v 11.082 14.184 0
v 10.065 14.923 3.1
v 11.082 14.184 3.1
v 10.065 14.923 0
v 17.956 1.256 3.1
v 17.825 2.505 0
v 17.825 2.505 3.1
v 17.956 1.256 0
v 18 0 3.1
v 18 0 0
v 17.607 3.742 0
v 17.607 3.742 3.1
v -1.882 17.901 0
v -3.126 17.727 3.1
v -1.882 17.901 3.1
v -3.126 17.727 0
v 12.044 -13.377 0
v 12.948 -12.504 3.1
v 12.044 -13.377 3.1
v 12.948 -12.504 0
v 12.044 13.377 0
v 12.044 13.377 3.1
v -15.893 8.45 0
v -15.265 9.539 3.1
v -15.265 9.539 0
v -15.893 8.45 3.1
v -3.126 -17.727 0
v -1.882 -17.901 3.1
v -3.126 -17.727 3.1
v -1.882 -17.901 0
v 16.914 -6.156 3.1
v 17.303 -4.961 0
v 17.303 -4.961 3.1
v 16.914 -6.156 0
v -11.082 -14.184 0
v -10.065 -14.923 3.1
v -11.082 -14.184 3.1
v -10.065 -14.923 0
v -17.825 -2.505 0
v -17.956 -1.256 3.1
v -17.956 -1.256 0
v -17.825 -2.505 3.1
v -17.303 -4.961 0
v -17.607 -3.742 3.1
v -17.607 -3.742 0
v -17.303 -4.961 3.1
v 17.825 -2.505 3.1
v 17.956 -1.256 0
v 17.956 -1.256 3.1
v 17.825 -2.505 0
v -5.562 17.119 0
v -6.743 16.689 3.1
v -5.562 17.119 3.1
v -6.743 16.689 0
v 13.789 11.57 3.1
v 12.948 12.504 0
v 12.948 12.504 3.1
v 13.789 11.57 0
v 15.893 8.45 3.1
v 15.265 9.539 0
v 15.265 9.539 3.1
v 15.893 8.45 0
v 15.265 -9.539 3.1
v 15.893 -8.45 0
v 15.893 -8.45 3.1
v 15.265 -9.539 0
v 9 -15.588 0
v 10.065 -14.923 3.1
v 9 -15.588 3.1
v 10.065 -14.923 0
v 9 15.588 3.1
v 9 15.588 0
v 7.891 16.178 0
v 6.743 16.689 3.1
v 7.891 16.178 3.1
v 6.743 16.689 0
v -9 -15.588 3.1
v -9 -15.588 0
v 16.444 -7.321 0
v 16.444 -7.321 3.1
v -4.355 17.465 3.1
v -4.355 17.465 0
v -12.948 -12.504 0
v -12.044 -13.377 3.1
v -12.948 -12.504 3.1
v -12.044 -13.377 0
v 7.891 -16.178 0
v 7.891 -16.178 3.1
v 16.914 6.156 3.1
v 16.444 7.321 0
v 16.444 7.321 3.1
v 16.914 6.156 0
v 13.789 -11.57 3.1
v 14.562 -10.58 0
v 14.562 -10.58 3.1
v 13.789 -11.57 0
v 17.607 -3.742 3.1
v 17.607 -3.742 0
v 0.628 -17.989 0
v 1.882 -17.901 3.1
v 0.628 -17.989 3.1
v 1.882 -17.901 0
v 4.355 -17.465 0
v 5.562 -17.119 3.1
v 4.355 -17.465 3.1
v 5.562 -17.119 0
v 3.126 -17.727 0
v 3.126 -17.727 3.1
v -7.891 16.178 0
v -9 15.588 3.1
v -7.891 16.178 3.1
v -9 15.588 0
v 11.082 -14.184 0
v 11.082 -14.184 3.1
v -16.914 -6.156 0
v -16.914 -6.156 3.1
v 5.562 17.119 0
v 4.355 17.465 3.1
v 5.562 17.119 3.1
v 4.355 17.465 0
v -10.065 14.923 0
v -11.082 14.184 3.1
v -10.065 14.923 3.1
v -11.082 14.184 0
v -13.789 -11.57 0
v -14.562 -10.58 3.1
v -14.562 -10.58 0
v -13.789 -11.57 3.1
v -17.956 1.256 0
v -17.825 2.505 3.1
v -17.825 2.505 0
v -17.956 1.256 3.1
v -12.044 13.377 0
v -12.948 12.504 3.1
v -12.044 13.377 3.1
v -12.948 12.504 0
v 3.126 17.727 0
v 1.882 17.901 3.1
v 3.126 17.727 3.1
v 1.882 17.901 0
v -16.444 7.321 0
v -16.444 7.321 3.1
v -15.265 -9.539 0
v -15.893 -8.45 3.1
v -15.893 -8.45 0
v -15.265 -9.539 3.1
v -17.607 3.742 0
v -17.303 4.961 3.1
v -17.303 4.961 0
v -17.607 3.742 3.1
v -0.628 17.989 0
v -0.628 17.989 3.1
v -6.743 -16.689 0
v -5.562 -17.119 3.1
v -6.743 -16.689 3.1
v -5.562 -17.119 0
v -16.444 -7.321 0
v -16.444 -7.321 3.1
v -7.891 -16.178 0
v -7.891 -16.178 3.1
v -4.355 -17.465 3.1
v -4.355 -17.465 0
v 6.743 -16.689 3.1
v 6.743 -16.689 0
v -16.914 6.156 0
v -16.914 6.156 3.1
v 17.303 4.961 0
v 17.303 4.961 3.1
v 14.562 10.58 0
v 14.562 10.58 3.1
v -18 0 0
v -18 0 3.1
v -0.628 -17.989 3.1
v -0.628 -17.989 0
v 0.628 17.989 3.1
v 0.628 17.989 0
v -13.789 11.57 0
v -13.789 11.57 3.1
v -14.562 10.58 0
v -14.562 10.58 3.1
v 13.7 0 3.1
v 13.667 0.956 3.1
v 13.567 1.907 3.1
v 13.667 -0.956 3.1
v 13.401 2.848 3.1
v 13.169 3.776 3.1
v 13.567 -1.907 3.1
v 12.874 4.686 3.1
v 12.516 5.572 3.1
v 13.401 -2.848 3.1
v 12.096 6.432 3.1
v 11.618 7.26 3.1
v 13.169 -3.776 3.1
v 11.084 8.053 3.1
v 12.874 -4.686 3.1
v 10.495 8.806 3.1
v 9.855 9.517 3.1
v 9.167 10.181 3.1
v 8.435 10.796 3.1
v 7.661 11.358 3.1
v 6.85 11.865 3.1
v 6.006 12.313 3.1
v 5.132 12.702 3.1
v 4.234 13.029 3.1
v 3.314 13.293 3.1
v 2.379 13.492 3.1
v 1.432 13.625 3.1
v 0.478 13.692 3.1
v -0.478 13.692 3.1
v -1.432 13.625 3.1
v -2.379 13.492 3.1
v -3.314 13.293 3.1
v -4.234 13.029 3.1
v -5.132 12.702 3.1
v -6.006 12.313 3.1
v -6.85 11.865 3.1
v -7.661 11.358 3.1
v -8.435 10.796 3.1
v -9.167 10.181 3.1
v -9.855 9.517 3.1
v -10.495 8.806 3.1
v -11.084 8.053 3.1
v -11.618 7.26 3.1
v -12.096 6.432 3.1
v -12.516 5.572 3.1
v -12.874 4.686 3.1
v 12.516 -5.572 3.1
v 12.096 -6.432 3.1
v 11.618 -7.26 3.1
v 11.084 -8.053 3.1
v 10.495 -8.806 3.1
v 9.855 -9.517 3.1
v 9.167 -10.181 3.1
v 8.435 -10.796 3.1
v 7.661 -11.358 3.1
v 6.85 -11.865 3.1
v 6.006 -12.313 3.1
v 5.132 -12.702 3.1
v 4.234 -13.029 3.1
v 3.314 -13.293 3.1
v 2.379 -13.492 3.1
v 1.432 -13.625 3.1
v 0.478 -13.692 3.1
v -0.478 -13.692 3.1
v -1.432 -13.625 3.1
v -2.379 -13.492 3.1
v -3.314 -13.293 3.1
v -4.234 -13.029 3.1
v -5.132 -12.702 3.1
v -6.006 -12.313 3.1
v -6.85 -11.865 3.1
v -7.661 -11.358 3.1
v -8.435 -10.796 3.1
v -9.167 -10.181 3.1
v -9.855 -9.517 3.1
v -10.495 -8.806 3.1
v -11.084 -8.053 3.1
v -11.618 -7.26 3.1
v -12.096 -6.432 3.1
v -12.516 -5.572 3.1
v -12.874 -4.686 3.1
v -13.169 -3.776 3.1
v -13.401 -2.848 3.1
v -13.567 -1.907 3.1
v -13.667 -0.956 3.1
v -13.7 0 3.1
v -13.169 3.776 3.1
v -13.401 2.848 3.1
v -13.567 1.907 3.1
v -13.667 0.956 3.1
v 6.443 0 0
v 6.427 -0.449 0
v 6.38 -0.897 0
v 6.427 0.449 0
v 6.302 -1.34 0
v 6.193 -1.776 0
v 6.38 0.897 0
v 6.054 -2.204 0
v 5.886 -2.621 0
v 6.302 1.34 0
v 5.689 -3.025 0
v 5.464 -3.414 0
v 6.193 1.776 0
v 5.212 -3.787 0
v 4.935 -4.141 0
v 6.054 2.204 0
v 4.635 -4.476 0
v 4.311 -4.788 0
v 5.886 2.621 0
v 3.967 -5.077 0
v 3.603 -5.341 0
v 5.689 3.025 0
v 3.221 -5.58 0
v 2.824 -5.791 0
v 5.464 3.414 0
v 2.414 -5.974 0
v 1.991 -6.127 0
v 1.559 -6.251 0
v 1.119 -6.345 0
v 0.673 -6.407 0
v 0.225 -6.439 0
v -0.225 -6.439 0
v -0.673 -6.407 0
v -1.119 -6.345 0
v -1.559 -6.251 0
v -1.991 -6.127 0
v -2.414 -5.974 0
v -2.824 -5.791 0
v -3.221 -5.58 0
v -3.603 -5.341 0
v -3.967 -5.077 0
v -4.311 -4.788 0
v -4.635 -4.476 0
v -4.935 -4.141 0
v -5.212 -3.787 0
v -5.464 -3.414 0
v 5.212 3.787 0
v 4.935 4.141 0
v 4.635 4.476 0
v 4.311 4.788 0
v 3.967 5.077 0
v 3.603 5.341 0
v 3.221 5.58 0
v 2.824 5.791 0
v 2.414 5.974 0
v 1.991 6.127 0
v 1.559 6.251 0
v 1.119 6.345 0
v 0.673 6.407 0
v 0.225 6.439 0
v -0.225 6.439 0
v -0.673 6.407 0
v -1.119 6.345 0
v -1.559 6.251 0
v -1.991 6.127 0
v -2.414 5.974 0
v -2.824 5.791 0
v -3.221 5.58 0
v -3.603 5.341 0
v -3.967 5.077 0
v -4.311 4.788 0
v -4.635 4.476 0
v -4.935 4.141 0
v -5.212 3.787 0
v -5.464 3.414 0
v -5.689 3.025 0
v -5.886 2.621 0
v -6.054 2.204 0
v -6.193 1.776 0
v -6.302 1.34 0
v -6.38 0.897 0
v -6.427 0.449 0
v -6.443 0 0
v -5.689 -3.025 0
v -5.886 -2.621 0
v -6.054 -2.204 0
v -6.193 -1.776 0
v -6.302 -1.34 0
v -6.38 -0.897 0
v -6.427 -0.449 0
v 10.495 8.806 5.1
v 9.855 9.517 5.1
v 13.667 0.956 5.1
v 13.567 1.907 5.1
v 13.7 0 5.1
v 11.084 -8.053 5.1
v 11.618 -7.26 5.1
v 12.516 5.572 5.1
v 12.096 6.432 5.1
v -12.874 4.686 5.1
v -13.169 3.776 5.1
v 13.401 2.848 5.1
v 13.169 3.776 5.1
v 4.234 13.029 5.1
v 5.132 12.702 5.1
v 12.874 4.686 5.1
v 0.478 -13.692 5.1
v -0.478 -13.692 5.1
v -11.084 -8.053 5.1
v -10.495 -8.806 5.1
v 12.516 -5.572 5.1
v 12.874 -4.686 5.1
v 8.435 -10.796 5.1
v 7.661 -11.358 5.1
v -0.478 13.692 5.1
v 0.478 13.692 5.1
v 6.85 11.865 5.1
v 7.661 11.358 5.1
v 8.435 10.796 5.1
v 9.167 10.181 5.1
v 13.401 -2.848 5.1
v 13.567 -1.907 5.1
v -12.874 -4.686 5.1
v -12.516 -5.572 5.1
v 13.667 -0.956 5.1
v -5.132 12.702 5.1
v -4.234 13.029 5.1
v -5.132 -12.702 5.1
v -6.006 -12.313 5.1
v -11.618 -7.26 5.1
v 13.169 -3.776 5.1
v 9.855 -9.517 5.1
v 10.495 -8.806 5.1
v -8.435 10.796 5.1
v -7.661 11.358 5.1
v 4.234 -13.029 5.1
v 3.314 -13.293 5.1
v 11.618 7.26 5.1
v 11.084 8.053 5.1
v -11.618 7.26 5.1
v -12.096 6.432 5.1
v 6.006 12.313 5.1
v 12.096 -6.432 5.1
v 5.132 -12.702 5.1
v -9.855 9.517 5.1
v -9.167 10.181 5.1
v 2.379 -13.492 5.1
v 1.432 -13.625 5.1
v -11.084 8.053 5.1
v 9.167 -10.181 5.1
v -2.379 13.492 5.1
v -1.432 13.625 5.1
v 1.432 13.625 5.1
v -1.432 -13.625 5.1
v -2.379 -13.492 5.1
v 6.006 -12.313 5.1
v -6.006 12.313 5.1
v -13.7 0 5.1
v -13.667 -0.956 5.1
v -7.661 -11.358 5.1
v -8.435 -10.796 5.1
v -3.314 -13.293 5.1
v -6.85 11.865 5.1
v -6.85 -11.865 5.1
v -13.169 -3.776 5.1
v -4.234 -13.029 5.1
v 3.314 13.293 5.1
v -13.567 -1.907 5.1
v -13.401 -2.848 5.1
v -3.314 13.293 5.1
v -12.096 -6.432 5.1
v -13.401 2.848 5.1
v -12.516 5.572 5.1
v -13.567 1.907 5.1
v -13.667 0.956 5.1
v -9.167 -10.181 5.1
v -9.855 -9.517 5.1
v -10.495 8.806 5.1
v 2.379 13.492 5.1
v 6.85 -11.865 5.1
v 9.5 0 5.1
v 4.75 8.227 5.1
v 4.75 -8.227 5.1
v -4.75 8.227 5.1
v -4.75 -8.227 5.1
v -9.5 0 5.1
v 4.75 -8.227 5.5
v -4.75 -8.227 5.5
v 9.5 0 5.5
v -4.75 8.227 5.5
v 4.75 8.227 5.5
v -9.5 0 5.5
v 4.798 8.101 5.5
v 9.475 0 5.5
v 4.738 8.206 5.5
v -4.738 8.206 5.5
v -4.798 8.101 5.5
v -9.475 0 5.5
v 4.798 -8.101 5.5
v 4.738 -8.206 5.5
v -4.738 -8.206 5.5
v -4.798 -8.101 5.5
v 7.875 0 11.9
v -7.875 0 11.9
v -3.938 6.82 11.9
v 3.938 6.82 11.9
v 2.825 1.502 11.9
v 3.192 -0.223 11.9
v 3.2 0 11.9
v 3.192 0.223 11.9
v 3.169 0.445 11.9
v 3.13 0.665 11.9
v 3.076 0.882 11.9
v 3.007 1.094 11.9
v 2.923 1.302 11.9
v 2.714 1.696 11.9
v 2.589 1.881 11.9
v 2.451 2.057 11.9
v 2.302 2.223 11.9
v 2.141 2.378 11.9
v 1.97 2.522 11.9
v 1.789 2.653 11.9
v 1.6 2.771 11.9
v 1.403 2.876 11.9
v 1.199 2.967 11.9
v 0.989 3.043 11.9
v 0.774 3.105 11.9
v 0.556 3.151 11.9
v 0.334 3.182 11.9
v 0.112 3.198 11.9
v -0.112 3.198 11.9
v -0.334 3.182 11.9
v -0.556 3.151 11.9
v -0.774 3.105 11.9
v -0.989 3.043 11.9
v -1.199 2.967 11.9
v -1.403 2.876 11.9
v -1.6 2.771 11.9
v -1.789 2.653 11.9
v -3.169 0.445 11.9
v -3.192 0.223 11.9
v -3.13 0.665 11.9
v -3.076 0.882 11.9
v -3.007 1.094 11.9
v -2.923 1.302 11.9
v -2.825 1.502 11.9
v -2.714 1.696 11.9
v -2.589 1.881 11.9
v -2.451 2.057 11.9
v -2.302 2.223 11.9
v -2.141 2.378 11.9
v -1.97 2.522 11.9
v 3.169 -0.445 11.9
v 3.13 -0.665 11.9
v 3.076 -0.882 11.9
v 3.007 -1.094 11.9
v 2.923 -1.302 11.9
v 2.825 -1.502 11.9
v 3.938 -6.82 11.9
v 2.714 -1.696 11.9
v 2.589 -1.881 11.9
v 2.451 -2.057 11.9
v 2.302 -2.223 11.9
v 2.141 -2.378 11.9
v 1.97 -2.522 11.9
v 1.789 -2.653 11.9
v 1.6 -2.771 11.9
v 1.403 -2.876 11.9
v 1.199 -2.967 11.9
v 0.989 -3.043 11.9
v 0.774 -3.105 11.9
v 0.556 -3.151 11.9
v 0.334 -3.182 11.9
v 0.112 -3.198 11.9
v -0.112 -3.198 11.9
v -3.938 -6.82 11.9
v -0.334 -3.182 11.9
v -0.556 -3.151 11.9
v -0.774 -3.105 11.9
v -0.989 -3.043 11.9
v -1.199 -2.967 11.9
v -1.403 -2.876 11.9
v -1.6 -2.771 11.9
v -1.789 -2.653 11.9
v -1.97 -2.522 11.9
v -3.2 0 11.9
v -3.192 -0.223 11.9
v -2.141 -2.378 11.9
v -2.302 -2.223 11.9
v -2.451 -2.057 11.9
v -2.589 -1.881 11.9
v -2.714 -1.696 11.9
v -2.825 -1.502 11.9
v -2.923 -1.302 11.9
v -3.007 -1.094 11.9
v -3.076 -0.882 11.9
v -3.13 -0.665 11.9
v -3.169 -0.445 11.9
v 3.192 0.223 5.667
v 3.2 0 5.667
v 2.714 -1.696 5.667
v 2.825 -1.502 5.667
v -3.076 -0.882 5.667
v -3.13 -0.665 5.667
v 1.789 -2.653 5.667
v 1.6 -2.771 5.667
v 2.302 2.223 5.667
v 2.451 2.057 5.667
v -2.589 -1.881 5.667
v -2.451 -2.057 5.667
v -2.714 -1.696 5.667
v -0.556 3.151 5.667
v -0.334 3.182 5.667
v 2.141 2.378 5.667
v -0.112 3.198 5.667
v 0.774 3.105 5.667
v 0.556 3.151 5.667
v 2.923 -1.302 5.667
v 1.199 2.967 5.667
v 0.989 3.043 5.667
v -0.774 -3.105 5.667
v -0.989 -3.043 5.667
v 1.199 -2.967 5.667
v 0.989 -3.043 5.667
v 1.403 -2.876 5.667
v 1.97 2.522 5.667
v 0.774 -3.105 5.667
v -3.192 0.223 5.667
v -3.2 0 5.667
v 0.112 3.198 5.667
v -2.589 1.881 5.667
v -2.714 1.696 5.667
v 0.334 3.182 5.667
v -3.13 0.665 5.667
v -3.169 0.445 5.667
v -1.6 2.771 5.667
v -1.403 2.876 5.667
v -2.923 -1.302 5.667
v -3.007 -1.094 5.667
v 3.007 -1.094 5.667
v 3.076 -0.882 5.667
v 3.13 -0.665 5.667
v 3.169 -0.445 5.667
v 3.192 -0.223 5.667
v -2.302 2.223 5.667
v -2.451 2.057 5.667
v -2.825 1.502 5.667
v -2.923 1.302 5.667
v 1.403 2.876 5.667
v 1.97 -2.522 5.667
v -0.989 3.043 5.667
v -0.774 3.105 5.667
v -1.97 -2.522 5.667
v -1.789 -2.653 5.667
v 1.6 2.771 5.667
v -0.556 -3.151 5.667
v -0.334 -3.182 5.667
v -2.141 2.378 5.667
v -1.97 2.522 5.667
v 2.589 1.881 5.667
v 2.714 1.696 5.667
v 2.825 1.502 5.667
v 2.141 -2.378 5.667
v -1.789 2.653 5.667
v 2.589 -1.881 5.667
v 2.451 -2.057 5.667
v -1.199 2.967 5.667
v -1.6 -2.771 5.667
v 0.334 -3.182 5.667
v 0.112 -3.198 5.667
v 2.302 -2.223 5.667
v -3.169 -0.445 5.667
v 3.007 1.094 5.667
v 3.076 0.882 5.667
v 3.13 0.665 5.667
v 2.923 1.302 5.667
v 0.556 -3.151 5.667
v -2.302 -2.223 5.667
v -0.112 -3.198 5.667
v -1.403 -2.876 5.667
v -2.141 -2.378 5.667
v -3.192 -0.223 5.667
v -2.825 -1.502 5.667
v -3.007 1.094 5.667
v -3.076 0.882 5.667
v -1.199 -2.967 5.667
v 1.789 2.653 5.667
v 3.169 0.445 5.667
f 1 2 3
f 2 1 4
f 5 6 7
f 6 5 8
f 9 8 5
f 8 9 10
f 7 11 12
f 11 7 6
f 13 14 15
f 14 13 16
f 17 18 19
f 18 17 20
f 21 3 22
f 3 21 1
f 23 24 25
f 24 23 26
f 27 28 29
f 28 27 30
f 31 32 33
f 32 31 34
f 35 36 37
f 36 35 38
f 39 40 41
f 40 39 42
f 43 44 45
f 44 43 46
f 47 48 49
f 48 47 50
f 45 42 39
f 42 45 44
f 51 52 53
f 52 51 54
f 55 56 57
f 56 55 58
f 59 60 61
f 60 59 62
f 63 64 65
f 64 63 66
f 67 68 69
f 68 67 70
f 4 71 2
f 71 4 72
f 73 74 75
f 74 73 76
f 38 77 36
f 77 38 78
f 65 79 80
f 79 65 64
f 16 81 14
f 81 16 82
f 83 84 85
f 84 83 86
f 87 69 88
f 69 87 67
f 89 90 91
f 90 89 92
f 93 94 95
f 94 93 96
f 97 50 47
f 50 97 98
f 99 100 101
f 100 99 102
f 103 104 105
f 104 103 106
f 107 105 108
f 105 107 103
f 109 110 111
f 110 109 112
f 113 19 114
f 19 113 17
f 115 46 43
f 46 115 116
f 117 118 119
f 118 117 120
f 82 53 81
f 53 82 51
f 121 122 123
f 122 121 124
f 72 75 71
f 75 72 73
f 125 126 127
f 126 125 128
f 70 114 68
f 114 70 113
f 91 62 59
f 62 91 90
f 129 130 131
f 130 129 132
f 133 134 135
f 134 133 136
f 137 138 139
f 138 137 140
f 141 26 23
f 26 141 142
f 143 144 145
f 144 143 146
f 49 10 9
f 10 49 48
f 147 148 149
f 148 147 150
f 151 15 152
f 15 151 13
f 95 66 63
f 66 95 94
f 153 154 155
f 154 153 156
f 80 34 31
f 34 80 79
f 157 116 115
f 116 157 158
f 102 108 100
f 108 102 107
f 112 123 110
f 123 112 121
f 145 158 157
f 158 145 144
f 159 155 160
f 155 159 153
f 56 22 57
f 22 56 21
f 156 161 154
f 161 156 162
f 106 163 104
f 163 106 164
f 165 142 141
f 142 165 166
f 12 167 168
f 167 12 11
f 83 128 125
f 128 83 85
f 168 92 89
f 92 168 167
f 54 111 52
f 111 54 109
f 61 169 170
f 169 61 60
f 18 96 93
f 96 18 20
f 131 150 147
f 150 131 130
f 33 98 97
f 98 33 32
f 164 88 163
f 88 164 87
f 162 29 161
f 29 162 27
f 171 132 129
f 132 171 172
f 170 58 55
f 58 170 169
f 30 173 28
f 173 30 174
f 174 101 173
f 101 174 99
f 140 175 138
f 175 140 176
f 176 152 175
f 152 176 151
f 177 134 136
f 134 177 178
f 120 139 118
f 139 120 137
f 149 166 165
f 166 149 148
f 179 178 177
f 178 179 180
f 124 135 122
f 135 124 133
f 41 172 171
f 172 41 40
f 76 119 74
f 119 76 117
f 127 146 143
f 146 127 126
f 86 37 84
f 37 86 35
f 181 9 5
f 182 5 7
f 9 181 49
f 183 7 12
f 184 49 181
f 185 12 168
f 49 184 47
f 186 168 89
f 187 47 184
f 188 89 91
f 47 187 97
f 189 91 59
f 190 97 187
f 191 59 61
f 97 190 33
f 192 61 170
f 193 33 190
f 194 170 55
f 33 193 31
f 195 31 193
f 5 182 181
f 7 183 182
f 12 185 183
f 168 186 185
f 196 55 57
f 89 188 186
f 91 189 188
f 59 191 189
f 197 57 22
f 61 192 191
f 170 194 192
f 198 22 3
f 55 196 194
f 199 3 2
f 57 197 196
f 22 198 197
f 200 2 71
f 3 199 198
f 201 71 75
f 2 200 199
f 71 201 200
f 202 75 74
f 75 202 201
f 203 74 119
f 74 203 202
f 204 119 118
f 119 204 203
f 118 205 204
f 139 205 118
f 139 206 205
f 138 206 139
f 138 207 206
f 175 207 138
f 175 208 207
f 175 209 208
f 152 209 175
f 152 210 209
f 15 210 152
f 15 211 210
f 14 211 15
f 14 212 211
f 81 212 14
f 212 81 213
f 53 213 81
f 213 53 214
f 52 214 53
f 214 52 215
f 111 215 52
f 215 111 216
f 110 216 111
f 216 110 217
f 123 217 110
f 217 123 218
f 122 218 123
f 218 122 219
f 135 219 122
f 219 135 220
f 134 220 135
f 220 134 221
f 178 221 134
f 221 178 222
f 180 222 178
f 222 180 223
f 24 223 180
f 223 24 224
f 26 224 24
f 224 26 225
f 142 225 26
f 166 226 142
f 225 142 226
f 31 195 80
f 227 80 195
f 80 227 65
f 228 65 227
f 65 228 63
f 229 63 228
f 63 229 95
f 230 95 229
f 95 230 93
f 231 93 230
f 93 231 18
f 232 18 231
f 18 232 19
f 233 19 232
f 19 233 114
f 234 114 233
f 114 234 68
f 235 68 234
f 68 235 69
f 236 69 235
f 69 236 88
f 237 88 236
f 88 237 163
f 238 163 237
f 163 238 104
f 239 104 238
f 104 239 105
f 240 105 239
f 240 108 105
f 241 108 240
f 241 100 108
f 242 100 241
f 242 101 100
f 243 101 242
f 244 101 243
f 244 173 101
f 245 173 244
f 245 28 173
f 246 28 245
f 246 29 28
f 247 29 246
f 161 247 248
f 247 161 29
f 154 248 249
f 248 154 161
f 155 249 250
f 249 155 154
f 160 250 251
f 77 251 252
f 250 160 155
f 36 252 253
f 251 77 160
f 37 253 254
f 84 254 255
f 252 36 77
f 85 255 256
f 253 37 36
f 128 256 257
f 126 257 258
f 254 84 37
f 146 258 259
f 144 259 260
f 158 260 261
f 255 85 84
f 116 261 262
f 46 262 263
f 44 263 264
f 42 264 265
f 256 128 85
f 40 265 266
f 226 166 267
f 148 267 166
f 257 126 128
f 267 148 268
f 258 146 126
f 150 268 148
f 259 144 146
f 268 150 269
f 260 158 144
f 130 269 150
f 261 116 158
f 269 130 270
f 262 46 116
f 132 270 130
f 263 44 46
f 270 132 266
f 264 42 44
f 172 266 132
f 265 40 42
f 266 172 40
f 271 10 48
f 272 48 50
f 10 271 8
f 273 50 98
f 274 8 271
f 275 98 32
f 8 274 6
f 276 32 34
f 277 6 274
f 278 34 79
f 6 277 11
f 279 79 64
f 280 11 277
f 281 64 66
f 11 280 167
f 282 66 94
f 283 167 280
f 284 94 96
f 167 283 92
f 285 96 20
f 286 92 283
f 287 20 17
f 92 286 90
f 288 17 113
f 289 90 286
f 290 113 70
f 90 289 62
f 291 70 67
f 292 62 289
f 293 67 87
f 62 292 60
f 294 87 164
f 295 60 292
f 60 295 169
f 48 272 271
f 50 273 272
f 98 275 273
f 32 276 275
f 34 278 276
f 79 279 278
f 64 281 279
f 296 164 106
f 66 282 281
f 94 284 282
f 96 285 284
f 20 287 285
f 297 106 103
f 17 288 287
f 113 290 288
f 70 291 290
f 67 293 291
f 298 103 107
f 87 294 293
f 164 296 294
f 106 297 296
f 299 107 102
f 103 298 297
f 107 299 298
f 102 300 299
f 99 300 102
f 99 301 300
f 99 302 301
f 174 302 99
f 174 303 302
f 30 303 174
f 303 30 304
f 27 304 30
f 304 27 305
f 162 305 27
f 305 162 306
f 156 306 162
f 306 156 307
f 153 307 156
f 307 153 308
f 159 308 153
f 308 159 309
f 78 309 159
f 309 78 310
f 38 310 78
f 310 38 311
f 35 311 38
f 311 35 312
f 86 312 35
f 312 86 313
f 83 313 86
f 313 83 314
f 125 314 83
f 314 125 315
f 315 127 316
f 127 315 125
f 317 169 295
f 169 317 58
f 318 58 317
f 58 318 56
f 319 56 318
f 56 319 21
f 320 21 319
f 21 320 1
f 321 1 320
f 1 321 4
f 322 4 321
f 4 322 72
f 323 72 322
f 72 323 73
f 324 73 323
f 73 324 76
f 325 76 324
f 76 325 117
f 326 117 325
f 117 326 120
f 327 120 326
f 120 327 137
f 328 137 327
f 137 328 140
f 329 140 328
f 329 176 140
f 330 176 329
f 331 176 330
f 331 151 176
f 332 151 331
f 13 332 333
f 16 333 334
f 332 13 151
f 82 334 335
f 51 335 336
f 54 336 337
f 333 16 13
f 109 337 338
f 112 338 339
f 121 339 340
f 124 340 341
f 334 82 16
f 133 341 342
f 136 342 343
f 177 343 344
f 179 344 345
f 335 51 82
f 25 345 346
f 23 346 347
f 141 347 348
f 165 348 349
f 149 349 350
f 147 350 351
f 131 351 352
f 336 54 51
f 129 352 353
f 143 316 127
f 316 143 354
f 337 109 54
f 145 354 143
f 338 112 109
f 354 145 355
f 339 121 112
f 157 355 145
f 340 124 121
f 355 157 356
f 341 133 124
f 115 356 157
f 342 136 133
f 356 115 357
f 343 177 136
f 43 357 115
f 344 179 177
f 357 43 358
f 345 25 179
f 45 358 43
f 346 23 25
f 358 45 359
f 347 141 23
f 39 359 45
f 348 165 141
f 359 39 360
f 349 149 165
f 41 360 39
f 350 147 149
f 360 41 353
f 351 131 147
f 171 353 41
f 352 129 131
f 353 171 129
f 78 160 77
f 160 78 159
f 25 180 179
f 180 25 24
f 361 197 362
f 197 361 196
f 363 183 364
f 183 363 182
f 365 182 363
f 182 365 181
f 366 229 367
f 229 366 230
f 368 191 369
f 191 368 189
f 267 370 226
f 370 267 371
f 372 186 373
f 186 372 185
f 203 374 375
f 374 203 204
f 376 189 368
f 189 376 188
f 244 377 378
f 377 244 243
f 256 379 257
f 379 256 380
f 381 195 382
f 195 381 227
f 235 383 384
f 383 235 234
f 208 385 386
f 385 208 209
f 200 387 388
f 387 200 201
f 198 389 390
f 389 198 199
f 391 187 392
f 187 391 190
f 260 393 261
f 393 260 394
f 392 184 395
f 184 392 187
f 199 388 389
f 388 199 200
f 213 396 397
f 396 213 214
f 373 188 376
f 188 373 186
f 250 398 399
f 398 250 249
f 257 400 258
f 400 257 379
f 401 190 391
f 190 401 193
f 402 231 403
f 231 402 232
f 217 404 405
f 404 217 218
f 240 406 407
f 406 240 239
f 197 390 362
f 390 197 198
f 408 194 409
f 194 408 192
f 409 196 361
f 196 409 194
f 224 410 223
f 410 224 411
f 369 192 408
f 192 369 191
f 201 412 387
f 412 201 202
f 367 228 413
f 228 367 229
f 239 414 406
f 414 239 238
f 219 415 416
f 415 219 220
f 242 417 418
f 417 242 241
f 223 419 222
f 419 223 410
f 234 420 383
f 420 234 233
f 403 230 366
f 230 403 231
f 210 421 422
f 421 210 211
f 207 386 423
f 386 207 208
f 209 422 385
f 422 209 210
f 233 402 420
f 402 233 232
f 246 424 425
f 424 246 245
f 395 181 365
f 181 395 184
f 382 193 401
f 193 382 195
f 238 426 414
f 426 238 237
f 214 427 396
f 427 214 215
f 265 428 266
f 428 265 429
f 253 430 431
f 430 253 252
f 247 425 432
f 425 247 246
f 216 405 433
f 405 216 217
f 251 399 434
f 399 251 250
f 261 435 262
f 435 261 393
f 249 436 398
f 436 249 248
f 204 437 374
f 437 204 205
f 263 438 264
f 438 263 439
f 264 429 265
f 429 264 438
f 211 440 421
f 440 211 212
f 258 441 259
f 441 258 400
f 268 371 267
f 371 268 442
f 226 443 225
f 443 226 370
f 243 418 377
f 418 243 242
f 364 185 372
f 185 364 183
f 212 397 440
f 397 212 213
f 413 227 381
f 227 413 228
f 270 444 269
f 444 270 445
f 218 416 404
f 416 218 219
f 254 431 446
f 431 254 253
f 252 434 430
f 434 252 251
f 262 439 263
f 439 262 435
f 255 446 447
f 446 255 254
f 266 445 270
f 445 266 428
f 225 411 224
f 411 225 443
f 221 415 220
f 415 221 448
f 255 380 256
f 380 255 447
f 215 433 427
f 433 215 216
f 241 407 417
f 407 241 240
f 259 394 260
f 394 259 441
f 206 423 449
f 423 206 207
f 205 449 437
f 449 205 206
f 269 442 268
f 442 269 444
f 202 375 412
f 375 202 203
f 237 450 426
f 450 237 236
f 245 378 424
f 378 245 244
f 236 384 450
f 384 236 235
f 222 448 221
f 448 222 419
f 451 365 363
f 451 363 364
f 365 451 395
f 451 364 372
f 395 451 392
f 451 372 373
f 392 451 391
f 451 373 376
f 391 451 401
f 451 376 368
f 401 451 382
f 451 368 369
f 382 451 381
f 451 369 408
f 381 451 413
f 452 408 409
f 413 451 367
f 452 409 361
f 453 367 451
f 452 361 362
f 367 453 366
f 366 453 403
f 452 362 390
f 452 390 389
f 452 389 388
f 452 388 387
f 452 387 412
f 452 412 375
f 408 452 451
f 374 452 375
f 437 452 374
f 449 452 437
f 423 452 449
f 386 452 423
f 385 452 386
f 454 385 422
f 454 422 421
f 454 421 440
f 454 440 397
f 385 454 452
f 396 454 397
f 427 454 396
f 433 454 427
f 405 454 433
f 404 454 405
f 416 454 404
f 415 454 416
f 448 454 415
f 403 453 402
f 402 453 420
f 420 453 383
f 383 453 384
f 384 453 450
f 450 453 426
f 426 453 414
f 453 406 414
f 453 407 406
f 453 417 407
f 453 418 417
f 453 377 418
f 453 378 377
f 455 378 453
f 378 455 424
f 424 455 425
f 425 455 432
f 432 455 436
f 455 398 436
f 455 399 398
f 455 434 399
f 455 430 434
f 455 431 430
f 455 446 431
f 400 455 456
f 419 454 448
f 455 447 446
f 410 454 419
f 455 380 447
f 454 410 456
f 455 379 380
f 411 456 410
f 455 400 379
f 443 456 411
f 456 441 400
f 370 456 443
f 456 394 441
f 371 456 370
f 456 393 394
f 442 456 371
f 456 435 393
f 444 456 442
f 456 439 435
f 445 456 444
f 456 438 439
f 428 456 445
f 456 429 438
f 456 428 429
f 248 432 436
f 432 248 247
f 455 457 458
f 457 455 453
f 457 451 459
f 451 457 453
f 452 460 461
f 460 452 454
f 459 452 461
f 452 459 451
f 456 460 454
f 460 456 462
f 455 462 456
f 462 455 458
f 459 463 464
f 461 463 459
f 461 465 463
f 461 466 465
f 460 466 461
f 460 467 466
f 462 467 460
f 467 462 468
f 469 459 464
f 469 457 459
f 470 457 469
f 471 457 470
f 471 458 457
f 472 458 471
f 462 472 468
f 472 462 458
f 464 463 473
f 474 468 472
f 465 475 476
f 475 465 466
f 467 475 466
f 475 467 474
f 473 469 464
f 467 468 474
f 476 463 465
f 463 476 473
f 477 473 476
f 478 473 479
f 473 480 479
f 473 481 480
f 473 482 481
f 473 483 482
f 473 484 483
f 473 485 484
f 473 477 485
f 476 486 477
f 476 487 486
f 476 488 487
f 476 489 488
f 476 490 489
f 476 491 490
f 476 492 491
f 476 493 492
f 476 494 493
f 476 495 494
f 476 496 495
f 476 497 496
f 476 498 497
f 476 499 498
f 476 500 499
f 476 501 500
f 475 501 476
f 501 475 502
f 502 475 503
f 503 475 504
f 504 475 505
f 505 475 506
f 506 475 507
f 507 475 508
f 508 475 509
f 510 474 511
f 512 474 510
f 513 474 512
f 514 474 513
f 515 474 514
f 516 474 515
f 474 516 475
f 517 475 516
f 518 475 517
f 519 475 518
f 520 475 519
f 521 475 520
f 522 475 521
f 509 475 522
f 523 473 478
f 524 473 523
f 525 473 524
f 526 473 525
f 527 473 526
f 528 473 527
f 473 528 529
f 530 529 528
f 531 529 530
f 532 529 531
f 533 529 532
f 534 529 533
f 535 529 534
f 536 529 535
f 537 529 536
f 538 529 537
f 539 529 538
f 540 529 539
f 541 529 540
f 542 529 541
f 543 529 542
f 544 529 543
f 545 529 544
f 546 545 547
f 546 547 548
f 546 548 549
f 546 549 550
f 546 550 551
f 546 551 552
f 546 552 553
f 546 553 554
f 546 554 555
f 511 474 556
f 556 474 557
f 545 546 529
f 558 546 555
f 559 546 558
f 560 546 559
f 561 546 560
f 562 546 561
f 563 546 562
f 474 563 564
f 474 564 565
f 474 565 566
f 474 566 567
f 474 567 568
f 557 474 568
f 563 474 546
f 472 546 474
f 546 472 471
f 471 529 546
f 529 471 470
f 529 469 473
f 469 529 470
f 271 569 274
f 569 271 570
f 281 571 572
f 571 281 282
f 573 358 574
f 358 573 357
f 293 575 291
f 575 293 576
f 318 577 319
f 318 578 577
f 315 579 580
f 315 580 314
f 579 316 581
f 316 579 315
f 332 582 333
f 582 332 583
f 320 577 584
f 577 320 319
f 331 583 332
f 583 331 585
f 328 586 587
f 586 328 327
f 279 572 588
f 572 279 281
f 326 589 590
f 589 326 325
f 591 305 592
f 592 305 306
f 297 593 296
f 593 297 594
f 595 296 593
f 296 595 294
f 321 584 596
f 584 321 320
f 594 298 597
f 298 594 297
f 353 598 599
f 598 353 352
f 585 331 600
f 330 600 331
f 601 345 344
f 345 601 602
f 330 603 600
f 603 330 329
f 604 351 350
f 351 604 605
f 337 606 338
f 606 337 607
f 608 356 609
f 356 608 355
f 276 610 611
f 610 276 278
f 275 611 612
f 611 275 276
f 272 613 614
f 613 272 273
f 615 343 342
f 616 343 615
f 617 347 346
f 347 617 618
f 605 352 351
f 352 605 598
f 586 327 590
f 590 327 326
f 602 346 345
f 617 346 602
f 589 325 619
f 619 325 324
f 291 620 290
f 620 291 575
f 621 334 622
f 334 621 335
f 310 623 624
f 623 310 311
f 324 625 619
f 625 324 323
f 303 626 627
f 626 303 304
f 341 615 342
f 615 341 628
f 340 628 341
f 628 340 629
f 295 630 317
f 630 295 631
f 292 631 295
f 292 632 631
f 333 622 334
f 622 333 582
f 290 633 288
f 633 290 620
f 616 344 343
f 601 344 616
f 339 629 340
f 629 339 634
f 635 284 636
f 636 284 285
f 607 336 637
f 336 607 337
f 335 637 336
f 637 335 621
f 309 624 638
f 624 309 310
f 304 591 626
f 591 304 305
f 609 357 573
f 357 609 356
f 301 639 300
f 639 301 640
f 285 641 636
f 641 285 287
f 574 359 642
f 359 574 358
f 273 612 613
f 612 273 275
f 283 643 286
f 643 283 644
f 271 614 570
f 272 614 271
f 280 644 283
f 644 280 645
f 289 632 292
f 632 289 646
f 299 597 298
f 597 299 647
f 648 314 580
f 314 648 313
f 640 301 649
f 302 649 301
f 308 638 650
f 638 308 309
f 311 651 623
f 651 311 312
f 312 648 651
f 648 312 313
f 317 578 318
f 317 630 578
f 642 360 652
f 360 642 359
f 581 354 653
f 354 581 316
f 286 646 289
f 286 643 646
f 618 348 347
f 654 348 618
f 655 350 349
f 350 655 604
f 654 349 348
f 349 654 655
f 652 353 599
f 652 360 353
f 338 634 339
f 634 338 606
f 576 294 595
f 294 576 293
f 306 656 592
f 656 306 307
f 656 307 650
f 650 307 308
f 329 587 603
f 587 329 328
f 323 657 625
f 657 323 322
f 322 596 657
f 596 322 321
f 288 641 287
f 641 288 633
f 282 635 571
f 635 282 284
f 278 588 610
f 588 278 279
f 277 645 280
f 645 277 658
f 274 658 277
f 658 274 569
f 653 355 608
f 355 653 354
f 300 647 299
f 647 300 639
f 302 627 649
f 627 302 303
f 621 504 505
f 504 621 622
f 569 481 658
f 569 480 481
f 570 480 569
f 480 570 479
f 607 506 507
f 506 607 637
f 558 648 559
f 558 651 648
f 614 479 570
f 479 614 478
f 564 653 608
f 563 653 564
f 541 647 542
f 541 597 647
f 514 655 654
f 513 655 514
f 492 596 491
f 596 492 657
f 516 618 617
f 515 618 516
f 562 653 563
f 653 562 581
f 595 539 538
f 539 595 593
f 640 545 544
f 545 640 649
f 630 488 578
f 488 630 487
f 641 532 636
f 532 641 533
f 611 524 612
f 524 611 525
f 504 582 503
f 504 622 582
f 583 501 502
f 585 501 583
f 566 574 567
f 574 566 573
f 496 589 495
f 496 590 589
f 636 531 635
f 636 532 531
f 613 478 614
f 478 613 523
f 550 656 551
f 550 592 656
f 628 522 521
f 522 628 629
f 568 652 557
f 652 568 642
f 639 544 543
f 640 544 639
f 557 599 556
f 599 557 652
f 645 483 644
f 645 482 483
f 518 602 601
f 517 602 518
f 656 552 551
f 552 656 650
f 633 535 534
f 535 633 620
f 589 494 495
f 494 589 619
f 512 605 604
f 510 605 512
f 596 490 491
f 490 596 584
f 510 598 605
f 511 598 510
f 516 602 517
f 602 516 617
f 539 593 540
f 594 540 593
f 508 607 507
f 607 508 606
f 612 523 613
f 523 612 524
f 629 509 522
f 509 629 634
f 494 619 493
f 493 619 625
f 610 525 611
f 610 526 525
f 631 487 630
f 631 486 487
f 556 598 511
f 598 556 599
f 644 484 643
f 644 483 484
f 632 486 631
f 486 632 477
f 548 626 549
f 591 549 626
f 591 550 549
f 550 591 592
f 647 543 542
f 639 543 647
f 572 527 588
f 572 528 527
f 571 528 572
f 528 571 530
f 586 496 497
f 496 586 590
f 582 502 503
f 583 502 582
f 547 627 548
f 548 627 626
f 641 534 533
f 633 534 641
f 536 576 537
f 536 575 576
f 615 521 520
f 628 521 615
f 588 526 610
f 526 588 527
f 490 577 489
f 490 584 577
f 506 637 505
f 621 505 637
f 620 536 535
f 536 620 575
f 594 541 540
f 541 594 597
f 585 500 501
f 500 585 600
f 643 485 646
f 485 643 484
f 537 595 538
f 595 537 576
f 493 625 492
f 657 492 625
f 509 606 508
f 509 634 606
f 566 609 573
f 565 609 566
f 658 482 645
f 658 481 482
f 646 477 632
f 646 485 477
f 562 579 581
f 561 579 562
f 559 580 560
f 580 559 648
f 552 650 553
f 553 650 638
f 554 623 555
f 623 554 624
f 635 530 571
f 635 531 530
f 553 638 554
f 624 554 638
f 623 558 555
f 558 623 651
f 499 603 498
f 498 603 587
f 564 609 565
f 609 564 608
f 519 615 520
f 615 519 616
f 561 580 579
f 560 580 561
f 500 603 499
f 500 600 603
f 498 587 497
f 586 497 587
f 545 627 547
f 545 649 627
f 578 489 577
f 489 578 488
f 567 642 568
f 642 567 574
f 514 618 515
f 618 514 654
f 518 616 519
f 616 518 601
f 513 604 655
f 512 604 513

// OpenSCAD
// hole to fit in
hole_r=13.7;
hole_d=2;

// backing plate
plate_r=18;
plate_d=3;

// sloped hex key
key_h=0.4; // raise base of key slightly
key_base=9.5; // receptacle is 10
key_slope=0.25; // r2 = r1 - slope * length
key_length=6.5; // receptacle is 8

// screw hole
fix_r=3.2; // clearance for M6, holes print slightly small
recess_r1=6.5; // clearance for countersunk screw face
recess_r2=0; // countersink=0 (for counterbore =recess_r1)
recess_d=recess_r1*tan(60); // 60 degree angle for countersink


over=0.1;
d_tot=plate_d+key_h+hole_d+8;
echo("Total Height (countersunk screw length more than): ", d_tot);
echo("(counterbore only) Screw Length more than: ", d_tot-recess_d);

difference() {
    union() {
        cylinder(r=plate_r,h=plate_d+over,$fn=90);
        translate([0,0,plate_d]) cylinder(r=hole_r,h=hole_d+over,$fn=90);
        translate([0,0,plate_d+hole_d]) cylinder(r=key_base, h=key_h+over, $fn=6);
        translate([0,0,plate_d+hole_d+key_h]) cylinder(r1=key_base, r2=key_base-key_slope*key_length, h=key_length, $fn=6);
    }
        translate([0,0,-over]) cylinder(r1=recess_r1, r2=recess_r2,h=recess_d+over,$fn=90);
        translate([0,0,-over]) cylinder(r=fix_r,h=d_tot+2*over,$fn=90);

}
